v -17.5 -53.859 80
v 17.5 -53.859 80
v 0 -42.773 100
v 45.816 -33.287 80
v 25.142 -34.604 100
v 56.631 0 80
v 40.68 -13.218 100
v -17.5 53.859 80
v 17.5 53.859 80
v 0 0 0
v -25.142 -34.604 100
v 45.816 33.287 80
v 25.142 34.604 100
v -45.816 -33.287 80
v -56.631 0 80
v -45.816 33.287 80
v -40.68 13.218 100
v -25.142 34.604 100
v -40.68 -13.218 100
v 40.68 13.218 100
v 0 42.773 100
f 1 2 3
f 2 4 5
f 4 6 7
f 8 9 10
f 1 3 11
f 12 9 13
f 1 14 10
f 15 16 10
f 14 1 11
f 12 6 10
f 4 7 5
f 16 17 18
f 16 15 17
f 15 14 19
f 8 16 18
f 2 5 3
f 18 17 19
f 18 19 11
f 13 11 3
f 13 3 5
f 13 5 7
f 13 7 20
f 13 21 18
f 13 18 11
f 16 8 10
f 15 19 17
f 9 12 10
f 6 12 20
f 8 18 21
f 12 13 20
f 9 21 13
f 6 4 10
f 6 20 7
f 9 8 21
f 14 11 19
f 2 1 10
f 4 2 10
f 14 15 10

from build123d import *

# Parameters (mm, degrees)
F5_DEPTH        = 20
F5_TAPER        = 29
F8_COPIES_COUNT = 10


# Not quite as in the source:
# - a pattern or mirror of a feature is missing from the dataset's text; its kind, count and spacing are read off the source's solid


with BuildPart() as f3:
    # F1 (on offset) → F3 section 0
    with BuildSketch(Plane.XY.offset(80), mode=Mode.PRIVATE) as f3_s0:
        Polygon((45.8155948031, -33.2869780703), (56.6311896062, 0), (45.8155948031, 33.2869780703), (17.5, 53.8594619006), (-17.5, 53.8594619006), (-45.8155948031, 33.2869780703), (-56.6311896062, 0), (-45.8155948031, -33.2869780703), (-17.5, -53.8594619006), (17.5, -53.8594619006), align=None)
    loft([Vertex(0, 0, 0), f3_s0.sketch])

    # F4 (on face) → F5 (join)
    with BuildSketch(Plane.XY.offset(80)):
        Polygon((45.8155948031, -33.2869780703), (56.6311896062, 0), (45.8155948031, 33.2869780703), (17.5, 53.8594619006), (-17.5, 53.8594619006), (-45.8155948031, 33.2869780703), (-56.6311896062, 0), (-45.8155948031, -33.2869780703), (-17.5, -53.8594619006), (17.5, -53.8594619006), align=None)
    extrude(amount=F5_DEPTH, taper=F5_TAPER)

    # F6 (on face) → F8 section 0
    with BuildSketch(Plane.XY.offset(100), mode=Mode.PRIVATE) as f8_s0:
        Polygon((44.9744890431, 0), (40.6798074962, 13.2176706945), (40.6798074962, -13.2176706945), align=None)
    f8 = loft([f8_s0.sketch, Vertex(56.6311896062, 0, 80)], mode=Mode.SUBTRACT)

    # F8_copies: F8 ×10 about axis
    f8_copies_axis = Axis((0, 0, 0), (0, 0, 1))
    for i in range(1, F8_COPIES_COUNT):
        add(f8.rotate(f8_copies_axis, i * 360 / F8_COPIES_COUNT), mode=Mode.SUBTRACT)


solid = f3.part
